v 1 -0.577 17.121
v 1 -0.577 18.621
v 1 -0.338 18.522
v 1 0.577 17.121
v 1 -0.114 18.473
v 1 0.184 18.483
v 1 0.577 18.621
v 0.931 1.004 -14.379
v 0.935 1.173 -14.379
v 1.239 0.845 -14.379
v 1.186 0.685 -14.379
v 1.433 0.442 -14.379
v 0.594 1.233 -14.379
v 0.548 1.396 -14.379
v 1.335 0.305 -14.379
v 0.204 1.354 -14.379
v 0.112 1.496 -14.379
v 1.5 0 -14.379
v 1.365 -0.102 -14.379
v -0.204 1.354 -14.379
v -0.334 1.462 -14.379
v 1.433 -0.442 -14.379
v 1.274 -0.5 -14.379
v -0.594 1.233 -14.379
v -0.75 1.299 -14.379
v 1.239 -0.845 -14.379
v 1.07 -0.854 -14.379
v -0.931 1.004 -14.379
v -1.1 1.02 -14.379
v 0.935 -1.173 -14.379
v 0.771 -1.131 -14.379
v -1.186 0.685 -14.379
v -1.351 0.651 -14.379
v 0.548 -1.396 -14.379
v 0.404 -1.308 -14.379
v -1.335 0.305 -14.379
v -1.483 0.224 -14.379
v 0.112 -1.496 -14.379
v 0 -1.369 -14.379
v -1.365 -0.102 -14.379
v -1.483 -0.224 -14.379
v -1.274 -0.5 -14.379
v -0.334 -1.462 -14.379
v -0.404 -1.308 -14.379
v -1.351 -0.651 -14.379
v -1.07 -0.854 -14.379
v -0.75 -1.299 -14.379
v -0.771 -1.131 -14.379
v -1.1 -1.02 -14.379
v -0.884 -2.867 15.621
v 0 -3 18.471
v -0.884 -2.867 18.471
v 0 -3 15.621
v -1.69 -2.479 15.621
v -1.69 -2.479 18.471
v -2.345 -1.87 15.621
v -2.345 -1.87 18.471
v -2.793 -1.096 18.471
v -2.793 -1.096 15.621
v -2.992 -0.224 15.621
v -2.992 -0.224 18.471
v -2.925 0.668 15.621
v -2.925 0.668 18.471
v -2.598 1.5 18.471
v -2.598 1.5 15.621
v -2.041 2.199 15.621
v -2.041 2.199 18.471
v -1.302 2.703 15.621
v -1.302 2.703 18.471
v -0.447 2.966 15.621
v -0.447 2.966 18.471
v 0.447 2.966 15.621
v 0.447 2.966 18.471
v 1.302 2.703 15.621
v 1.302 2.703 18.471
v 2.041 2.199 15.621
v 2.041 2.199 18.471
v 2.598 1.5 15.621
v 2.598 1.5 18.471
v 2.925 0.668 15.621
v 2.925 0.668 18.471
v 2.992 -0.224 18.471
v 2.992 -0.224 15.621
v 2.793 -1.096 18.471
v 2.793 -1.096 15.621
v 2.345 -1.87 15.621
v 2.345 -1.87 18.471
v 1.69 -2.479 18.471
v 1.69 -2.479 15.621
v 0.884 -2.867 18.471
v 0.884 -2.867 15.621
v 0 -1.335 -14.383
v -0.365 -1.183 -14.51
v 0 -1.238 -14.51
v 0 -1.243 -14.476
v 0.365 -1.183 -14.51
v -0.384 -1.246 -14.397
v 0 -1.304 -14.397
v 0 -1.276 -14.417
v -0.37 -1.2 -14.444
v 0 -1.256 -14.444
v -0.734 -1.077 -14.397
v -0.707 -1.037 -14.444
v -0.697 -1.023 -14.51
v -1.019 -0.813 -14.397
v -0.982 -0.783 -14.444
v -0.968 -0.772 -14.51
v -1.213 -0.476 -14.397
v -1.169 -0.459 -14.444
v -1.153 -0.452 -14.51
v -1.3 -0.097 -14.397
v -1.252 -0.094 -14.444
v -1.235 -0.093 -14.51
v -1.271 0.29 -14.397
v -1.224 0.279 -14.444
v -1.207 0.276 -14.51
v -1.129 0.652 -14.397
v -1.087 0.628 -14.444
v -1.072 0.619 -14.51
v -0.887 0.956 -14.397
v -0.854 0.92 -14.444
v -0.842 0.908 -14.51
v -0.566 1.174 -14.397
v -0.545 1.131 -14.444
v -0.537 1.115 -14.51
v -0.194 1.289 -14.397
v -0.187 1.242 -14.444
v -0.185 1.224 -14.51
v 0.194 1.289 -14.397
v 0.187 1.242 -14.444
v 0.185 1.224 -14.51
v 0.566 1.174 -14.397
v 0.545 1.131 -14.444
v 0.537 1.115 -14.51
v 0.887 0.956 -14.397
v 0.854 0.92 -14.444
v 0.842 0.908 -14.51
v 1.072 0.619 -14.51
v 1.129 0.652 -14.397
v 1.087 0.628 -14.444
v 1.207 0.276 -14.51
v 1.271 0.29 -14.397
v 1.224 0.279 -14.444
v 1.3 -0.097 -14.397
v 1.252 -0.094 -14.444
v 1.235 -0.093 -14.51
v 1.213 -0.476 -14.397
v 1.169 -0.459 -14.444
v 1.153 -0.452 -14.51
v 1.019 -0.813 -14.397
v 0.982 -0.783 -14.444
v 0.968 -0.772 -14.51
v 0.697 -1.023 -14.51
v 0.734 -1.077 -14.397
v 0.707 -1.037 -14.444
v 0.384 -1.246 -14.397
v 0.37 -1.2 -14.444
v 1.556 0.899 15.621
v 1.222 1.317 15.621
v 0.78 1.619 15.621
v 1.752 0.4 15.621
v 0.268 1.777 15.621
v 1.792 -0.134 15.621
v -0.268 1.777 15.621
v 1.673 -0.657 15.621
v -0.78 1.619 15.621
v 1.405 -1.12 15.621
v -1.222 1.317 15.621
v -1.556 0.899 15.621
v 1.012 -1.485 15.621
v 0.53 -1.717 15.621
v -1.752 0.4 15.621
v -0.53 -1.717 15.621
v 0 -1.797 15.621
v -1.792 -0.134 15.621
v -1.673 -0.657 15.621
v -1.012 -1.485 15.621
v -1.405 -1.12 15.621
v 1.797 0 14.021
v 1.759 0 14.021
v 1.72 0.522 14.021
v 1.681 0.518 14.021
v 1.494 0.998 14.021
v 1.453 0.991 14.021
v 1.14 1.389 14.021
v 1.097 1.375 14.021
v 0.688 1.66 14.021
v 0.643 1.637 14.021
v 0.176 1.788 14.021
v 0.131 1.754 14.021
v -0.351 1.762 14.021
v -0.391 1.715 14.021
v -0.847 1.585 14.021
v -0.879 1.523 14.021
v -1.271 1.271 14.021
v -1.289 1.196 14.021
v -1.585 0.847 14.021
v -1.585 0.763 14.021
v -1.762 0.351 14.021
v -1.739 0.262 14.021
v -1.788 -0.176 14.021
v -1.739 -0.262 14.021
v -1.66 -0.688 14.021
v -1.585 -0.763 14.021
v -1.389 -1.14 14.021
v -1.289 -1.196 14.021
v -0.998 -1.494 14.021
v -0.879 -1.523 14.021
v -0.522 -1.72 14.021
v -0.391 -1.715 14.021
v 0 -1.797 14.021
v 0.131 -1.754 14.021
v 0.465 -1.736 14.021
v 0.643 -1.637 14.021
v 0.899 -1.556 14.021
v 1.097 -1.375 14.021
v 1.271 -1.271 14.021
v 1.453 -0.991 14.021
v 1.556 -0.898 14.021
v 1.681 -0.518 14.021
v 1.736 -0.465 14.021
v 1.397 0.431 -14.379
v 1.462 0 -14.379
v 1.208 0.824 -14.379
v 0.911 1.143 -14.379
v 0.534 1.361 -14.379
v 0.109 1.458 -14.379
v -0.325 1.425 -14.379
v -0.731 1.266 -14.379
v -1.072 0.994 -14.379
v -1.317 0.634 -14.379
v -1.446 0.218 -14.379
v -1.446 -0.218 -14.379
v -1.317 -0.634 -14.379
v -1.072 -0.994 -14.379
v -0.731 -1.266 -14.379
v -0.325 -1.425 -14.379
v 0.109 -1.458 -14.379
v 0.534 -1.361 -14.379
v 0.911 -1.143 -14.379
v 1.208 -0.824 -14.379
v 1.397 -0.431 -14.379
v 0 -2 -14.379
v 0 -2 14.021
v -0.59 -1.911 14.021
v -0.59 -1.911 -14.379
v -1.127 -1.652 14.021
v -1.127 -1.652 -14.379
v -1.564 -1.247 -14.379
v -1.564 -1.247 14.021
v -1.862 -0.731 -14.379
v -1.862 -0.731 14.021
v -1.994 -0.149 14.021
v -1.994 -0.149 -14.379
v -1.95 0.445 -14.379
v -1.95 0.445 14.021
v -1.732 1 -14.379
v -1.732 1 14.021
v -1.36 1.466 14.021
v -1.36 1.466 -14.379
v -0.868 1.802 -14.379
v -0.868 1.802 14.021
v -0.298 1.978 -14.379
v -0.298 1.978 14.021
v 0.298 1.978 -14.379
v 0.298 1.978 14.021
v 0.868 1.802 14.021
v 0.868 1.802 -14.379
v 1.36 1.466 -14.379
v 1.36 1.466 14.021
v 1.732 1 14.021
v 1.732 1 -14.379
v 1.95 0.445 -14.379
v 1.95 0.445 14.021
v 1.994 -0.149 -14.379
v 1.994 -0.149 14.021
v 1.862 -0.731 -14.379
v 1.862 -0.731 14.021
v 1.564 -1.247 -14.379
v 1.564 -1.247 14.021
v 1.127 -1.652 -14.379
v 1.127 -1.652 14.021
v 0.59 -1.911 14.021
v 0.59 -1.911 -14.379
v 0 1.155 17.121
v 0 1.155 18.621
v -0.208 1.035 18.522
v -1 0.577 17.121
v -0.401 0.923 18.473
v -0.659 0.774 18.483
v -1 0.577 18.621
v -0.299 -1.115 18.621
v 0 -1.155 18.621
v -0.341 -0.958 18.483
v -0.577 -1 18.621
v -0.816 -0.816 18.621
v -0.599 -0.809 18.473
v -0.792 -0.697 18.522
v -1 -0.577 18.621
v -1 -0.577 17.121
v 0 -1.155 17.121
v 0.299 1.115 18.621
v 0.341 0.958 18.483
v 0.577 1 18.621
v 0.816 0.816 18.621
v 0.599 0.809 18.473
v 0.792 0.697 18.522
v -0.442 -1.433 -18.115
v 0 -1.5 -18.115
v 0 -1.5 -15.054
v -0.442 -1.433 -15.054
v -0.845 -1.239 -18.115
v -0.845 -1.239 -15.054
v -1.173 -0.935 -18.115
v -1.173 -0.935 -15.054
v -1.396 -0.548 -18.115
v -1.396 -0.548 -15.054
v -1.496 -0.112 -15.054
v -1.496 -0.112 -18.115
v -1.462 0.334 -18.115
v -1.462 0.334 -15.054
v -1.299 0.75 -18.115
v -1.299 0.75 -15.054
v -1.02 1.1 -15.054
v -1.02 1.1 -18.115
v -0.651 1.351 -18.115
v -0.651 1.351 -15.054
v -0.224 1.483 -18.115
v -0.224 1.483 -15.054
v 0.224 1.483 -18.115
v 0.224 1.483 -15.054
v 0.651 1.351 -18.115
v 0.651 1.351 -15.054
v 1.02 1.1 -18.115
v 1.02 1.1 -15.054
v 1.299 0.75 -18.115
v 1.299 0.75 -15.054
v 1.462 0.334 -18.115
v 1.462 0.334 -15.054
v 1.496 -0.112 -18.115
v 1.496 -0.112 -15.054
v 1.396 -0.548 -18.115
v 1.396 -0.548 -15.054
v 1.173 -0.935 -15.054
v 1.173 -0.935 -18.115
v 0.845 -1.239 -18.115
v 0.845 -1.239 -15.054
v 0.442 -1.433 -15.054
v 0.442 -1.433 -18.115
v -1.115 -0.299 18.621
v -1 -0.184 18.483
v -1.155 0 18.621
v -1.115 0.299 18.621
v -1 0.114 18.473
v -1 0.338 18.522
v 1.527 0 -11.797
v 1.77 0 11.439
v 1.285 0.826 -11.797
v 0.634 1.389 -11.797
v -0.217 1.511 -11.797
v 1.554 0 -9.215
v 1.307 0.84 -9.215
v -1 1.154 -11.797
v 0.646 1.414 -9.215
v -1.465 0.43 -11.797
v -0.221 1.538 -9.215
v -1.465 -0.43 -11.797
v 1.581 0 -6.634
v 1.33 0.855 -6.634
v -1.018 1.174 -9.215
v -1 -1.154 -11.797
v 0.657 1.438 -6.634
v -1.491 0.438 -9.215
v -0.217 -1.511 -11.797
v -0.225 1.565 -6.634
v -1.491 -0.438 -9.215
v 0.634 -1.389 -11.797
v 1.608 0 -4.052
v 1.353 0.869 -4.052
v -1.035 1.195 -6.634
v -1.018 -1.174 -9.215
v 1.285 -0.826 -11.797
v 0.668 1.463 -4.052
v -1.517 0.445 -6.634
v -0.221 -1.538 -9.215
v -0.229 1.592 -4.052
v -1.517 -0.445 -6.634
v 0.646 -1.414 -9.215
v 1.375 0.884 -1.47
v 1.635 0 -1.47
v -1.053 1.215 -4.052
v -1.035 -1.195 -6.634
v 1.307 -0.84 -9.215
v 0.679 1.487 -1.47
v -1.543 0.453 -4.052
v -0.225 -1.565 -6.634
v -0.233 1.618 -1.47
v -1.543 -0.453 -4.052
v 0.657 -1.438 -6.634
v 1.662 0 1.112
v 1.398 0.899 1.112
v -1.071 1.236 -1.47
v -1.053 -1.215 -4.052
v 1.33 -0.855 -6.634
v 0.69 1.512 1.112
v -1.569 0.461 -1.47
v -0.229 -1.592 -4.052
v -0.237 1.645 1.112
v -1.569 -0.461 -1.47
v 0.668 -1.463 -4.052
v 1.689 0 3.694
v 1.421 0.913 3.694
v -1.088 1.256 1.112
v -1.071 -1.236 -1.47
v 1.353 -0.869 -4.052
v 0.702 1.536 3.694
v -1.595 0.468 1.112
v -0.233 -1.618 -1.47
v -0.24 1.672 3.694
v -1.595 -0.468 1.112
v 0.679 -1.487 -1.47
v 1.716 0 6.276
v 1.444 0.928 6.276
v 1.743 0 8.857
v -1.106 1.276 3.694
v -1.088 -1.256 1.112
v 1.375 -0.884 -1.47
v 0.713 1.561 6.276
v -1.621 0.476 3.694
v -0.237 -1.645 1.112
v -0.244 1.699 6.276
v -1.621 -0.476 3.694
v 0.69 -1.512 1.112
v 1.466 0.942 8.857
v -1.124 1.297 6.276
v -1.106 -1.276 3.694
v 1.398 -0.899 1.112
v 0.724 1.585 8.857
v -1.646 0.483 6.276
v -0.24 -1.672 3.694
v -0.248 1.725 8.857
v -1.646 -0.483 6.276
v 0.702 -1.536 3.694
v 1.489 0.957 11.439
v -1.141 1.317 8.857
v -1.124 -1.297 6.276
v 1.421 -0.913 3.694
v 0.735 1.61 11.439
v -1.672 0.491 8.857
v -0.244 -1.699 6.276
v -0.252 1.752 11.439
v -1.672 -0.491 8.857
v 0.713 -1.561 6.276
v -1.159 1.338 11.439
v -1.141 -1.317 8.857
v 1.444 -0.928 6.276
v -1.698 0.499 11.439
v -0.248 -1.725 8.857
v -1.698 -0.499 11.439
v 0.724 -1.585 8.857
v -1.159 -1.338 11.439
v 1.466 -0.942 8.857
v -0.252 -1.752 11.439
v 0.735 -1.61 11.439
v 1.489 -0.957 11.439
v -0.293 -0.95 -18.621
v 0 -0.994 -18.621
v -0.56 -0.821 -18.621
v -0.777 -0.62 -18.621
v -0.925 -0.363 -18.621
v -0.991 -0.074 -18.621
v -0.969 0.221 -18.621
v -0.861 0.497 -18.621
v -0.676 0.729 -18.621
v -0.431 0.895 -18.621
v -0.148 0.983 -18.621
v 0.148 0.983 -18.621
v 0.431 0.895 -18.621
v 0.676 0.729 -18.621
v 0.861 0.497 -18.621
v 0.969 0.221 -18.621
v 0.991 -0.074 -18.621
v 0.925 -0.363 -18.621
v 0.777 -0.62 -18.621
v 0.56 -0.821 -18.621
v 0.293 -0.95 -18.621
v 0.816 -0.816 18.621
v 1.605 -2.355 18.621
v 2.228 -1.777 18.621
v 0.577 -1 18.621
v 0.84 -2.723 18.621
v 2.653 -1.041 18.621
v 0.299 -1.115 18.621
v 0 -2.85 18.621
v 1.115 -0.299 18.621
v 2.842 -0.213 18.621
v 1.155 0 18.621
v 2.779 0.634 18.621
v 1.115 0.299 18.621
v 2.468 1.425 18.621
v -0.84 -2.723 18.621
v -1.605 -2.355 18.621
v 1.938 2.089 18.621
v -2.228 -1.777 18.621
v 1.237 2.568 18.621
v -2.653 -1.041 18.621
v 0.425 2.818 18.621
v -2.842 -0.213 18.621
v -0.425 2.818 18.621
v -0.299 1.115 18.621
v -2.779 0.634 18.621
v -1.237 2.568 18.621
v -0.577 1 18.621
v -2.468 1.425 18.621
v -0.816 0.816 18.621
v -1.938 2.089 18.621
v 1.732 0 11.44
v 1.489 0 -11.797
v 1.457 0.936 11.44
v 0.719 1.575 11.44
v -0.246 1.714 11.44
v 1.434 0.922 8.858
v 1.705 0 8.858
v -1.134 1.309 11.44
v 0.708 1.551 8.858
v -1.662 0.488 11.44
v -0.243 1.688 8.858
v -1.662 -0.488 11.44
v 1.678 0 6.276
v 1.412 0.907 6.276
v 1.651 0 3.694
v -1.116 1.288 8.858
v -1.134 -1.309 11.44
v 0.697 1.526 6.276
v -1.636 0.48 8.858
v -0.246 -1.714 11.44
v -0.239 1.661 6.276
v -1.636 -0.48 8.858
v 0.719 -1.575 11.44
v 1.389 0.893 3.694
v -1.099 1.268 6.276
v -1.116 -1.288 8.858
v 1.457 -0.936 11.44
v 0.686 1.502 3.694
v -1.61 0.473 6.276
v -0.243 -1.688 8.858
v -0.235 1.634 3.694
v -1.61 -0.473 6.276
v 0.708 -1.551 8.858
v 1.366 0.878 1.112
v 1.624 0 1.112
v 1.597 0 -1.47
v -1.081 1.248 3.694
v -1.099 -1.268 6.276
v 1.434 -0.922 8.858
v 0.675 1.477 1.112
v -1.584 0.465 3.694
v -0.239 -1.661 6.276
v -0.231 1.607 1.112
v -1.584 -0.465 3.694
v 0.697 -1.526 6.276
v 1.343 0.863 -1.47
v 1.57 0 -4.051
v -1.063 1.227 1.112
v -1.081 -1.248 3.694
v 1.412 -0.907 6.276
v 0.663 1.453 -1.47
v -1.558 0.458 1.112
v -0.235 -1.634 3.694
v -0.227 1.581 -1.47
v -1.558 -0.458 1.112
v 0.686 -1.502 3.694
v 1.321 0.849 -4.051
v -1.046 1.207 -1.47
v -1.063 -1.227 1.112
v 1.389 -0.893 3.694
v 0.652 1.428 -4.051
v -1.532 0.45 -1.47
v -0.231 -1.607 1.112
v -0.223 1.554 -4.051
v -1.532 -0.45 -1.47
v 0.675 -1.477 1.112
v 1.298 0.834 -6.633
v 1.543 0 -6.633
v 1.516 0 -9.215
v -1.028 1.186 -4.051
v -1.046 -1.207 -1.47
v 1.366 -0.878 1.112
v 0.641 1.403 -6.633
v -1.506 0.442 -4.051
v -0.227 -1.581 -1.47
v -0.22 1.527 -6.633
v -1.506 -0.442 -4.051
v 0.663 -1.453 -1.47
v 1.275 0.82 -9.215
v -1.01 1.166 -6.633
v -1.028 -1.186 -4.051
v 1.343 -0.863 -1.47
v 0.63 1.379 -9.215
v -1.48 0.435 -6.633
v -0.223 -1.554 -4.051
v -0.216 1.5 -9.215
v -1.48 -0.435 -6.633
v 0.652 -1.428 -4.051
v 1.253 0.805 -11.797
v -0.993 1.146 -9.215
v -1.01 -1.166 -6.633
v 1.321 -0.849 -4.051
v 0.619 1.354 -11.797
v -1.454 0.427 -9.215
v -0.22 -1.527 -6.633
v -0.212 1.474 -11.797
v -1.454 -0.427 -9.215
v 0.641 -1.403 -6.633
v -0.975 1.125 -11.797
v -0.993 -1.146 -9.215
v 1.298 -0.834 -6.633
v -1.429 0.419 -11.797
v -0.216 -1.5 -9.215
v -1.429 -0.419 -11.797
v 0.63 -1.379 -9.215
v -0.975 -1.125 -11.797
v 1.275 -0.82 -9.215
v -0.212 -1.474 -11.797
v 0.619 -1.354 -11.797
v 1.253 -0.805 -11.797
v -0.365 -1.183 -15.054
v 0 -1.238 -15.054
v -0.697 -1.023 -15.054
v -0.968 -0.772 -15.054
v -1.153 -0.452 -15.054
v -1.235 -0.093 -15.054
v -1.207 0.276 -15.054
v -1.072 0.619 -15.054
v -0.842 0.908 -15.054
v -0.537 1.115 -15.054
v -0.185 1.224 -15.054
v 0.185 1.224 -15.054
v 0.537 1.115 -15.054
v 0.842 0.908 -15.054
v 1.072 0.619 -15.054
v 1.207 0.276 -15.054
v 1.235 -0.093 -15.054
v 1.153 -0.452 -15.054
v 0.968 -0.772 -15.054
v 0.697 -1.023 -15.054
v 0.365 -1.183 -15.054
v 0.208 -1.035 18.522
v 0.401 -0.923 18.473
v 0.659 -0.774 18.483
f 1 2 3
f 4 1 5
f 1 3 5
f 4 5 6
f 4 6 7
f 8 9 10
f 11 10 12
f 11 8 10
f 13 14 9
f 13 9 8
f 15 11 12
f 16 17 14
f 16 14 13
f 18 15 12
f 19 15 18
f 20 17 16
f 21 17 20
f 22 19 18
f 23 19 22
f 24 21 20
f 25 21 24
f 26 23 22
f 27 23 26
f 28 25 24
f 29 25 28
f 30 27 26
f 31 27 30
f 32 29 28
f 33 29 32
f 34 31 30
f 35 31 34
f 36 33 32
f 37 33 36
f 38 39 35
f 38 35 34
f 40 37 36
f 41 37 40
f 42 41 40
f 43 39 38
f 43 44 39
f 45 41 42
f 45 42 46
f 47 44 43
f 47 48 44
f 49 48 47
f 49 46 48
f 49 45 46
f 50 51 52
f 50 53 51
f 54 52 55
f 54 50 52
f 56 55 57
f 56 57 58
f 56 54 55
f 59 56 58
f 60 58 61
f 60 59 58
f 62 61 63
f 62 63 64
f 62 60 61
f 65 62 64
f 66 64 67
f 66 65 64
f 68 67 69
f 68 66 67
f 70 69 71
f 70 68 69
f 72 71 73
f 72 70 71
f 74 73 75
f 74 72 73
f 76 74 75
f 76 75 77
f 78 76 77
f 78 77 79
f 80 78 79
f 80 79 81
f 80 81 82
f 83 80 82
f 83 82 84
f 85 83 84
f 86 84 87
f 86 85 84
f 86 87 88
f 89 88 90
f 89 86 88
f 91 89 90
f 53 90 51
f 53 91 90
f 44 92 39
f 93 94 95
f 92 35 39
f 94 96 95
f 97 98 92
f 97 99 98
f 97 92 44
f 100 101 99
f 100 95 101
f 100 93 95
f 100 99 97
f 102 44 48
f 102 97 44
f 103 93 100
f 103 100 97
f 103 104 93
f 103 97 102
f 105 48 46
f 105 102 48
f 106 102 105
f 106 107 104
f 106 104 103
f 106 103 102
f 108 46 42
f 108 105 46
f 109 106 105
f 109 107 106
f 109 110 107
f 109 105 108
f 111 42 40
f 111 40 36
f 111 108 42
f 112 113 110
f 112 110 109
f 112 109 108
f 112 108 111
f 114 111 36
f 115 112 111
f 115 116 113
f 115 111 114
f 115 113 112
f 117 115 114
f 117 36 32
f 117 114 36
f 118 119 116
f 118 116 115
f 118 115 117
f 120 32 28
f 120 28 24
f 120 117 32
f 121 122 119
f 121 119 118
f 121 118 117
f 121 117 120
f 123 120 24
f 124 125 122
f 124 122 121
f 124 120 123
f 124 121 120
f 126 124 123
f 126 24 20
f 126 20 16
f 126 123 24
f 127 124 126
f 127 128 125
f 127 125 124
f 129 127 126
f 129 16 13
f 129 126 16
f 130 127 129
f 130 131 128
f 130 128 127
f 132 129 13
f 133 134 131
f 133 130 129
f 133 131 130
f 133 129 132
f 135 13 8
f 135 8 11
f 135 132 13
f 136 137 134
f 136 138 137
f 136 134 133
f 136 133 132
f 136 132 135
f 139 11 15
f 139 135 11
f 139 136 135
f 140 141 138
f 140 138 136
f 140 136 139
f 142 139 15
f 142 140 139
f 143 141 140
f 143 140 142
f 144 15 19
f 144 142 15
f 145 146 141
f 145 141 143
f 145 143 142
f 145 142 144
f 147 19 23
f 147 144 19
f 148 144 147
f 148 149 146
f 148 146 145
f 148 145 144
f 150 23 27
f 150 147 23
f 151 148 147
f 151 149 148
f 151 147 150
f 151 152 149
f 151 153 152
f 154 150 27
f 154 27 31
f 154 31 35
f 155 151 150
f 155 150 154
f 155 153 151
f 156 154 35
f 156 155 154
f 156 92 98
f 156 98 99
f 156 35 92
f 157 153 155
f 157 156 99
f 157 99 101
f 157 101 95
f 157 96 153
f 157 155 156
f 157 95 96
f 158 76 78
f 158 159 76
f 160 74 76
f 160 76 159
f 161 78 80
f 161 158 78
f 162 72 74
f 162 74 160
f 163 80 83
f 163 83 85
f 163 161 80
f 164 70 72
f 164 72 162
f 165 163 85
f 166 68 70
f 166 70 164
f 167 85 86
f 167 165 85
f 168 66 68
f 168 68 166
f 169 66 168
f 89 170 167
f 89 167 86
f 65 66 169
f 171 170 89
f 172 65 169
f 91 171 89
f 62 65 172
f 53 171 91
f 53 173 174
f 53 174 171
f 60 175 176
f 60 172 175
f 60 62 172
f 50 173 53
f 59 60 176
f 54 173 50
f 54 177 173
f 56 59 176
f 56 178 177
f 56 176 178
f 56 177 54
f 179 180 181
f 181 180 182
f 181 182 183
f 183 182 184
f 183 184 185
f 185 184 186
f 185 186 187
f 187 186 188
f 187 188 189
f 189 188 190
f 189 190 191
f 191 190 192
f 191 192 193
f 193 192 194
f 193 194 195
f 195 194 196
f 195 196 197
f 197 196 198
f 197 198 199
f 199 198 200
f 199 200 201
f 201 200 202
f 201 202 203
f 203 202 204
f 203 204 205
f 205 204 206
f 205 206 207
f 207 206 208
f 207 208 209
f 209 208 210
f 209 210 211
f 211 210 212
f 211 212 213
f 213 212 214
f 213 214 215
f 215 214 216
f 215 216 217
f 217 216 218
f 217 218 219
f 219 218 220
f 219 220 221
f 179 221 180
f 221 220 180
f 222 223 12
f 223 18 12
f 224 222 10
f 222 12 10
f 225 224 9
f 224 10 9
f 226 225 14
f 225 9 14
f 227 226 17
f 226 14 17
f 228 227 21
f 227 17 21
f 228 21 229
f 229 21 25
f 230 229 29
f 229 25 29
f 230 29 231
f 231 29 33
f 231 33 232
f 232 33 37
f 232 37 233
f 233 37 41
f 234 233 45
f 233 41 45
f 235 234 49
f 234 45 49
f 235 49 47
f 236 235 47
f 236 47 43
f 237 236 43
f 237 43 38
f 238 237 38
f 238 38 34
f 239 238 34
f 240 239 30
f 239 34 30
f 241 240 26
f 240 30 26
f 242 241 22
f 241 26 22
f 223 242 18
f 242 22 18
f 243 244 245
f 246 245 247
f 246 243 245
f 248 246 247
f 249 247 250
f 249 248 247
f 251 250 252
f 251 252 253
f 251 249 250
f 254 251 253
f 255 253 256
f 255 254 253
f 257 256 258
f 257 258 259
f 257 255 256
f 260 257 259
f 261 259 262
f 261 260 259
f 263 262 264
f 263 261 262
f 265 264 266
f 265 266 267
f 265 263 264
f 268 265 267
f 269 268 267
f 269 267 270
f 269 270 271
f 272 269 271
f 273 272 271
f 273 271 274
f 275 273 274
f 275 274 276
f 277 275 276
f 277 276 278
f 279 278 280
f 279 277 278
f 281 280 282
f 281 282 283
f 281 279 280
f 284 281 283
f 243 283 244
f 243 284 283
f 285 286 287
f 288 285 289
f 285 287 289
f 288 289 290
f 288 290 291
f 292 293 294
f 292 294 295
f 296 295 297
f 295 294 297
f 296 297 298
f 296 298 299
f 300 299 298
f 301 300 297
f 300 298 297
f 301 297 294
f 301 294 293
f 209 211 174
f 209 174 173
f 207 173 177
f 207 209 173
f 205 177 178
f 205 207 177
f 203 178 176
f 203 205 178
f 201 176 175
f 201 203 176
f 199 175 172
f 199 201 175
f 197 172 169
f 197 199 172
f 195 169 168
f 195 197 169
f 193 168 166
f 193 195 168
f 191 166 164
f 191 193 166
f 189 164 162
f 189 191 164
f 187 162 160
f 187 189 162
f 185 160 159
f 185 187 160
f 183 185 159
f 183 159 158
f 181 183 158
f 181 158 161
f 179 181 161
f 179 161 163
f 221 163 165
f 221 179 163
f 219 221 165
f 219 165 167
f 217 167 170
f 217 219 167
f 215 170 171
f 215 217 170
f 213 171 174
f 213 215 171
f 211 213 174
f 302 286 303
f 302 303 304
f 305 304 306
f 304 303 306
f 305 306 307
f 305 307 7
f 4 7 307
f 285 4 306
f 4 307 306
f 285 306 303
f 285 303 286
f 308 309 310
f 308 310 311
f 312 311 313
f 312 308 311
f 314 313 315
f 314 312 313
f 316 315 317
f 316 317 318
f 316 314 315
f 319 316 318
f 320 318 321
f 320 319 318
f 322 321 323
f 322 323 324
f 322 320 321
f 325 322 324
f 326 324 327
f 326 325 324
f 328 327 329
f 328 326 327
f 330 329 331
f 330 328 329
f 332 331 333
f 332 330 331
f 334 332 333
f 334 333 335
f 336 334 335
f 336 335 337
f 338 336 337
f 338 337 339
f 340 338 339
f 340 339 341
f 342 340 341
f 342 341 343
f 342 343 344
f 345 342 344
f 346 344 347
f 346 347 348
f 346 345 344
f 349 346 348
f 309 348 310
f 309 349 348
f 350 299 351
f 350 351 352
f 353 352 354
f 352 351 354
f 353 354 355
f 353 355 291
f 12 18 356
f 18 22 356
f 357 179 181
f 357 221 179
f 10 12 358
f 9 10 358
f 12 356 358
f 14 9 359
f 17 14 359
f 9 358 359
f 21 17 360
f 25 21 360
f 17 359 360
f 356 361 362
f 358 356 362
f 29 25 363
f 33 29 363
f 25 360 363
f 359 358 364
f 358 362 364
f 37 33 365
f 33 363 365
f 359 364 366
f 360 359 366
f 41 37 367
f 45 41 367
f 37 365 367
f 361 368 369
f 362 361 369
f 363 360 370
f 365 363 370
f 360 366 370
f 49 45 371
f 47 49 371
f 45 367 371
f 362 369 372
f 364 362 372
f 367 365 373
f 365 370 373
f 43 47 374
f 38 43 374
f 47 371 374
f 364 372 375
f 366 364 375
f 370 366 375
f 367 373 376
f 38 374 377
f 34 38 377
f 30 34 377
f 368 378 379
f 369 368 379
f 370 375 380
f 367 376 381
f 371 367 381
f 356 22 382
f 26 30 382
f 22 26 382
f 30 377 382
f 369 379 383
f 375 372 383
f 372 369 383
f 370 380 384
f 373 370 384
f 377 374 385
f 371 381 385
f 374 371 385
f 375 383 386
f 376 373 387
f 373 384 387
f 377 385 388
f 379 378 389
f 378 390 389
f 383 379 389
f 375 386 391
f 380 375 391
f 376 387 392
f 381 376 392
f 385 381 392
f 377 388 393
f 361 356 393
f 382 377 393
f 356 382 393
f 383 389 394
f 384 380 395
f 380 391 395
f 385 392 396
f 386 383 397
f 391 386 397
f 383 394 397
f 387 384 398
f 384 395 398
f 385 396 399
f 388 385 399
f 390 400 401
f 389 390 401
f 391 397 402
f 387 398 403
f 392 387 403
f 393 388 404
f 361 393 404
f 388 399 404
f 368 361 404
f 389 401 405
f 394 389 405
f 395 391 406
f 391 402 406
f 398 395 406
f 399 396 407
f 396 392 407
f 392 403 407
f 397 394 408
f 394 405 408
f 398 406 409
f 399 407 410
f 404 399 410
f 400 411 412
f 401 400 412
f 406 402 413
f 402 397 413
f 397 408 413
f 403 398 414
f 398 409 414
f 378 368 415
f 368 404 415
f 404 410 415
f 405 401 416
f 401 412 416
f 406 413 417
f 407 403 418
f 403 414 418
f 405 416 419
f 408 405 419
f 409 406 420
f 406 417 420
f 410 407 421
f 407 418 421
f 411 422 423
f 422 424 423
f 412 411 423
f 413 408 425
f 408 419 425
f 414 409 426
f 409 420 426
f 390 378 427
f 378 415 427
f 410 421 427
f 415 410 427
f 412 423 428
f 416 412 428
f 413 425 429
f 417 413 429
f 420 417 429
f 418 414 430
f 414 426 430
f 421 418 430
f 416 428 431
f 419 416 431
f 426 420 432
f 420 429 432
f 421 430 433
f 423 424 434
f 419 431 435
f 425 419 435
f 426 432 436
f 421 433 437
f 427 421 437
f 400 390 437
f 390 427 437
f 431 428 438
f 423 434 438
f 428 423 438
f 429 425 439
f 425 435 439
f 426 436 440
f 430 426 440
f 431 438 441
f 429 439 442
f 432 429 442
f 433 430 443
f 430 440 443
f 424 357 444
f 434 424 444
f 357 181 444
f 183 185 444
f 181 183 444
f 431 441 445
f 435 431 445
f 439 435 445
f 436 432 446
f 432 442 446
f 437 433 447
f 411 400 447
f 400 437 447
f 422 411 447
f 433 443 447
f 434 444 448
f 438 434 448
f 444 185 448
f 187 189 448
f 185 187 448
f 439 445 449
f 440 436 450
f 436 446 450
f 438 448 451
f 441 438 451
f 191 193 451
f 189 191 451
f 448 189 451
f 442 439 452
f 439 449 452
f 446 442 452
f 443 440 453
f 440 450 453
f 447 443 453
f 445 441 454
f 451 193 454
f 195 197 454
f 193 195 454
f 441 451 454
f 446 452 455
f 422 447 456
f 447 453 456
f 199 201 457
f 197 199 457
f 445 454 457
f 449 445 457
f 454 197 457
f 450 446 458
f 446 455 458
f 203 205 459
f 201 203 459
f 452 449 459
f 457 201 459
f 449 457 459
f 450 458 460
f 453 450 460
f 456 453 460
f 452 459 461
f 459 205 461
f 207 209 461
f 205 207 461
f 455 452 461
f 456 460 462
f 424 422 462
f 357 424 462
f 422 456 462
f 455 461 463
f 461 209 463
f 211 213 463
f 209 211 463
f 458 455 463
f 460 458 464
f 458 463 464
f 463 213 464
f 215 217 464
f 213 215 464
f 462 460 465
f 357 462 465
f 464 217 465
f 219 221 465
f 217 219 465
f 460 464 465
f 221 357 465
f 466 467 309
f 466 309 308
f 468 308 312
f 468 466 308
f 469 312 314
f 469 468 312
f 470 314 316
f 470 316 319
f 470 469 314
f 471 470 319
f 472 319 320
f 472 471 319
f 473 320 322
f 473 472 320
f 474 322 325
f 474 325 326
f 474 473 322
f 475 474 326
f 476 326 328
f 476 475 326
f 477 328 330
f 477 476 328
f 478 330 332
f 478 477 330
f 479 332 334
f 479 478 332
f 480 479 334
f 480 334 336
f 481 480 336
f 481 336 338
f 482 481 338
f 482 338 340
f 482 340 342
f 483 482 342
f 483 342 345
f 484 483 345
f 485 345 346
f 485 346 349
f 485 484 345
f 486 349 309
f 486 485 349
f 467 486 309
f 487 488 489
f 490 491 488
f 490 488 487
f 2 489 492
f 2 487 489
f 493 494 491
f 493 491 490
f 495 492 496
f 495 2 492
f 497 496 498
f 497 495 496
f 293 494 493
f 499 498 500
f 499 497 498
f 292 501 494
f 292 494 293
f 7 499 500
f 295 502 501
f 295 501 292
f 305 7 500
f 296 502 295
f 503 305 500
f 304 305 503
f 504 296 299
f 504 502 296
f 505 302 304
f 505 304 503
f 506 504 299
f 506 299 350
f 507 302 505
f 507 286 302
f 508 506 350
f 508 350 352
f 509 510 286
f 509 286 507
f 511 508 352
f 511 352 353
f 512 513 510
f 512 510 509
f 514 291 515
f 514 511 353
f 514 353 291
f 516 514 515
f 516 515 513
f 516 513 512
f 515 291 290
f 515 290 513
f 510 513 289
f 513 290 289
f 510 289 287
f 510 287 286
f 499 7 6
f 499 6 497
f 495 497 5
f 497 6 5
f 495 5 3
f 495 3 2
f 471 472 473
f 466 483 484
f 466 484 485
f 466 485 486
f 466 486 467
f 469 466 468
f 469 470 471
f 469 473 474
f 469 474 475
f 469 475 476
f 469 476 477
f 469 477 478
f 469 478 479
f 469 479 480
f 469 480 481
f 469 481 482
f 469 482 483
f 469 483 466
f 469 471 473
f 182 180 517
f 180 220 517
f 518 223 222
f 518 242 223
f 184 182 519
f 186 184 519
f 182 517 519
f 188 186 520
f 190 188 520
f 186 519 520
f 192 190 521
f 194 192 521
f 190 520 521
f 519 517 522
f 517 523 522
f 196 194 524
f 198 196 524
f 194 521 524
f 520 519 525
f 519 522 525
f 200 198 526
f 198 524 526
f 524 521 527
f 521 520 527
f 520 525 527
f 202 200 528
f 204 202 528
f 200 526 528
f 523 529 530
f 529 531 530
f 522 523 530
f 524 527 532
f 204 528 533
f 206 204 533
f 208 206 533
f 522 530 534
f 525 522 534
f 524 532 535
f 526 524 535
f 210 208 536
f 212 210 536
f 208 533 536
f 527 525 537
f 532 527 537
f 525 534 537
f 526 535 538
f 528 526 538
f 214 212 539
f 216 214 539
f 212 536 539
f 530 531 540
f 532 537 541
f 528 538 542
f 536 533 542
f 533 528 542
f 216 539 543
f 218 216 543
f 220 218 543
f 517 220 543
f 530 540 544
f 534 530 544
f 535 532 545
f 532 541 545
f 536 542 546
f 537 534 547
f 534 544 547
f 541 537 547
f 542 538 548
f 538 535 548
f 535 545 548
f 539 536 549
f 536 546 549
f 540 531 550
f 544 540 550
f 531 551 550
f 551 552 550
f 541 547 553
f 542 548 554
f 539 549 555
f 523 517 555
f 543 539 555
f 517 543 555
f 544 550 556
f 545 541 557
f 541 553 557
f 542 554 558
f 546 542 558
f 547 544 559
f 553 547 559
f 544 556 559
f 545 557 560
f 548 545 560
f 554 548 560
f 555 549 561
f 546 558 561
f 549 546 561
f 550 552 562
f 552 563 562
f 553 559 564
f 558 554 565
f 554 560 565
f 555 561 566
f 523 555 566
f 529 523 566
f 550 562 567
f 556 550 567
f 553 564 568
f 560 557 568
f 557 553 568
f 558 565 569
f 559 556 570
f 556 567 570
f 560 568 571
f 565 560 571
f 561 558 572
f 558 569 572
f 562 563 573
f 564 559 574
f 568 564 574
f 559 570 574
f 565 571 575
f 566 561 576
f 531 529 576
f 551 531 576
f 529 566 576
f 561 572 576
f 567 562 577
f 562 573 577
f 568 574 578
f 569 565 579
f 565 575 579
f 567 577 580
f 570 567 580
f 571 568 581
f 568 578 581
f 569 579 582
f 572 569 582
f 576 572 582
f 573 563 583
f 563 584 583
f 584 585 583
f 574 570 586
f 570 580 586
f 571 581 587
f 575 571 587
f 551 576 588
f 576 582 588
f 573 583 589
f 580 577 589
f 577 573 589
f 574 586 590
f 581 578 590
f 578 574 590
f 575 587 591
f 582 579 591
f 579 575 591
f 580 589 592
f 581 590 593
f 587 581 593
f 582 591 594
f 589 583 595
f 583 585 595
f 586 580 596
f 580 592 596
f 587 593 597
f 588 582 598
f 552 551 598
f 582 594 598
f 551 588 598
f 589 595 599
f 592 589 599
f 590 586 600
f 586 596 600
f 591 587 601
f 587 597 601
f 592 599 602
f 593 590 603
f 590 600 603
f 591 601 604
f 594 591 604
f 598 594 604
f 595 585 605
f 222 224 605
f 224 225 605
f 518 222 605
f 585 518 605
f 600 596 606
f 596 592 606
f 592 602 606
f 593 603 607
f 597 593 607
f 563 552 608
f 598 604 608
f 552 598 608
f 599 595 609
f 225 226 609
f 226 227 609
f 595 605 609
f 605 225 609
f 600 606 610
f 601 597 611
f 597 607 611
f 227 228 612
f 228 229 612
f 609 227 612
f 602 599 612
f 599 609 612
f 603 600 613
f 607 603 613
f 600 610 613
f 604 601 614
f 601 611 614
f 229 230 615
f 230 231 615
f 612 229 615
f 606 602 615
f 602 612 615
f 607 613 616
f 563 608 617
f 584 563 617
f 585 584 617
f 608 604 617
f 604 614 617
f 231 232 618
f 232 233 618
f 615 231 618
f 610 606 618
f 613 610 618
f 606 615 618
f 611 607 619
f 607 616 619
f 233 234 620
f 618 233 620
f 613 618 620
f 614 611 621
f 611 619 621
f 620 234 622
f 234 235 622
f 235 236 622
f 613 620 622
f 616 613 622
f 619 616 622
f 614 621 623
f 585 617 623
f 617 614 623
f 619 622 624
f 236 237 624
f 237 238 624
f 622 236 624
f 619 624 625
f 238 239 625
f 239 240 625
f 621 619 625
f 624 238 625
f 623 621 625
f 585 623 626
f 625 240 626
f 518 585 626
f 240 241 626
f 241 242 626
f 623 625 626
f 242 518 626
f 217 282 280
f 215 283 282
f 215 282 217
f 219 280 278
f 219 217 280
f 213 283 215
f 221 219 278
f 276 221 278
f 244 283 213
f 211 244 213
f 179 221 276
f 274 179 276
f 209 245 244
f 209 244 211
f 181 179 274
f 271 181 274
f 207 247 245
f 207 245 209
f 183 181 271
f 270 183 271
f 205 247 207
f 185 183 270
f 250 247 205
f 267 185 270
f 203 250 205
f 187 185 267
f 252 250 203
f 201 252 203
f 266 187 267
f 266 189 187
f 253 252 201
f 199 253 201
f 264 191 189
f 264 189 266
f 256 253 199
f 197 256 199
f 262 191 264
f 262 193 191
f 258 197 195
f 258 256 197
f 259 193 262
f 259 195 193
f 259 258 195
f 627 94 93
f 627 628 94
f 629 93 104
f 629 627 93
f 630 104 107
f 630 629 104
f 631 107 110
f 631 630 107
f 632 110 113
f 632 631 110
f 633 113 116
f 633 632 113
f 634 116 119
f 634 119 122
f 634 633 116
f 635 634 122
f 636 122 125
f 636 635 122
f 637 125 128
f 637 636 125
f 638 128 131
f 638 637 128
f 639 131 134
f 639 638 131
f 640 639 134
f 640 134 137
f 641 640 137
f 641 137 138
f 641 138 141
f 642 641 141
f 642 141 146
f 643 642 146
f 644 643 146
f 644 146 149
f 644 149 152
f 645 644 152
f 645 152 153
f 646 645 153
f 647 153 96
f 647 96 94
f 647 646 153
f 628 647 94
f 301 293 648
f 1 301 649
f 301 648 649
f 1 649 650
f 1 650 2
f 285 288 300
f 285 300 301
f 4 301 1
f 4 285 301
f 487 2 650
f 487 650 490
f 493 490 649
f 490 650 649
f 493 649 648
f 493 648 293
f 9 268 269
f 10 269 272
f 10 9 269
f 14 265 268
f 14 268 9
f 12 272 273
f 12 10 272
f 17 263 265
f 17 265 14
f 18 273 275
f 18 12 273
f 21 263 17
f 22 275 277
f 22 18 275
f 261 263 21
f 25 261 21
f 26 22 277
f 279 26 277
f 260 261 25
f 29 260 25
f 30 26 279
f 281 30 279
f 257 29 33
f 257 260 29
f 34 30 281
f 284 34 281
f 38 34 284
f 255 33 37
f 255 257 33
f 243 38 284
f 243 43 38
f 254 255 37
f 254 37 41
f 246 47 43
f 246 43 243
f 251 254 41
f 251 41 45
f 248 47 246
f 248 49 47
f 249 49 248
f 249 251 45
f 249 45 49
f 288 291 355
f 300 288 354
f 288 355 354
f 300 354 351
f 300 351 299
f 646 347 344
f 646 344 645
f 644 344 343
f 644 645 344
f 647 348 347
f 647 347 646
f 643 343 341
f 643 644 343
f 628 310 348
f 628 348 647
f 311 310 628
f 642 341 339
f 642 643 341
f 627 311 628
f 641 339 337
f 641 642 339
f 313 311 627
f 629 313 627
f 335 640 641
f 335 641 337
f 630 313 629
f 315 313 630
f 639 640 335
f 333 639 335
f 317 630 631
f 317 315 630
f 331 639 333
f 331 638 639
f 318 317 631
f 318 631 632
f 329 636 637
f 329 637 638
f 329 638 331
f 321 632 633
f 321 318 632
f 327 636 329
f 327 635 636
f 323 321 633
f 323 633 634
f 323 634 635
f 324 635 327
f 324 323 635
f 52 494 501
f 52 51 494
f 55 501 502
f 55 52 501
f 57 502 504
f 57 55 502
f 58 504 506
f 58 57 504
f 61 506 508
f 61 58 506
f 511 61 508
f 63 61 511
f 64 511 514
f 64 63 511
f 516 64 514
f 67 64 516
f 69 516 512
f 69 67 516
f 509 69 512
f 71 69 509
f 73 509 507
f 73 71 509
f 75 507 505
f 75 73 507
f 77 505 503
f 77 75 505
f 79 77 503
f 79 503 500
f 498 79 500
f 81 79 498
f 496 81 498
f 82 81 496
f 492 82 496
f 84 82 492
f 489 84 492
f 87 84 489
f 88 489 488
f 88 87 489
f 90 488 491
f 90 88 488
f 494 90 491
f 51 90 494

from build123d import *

# Parameters (mm, degrees)
CUT_EXTRUDE1_START = 18.621
CUT_EXTRUDE1_DEPTH = 1.5
CHAMFER2_SIZE      = 0.506148016


# Read off the part's stored shape, not the designer's step: Cut-Revolve-Thin1
with BuildPart() as part:
    # Sketch3 → Revolve1 (revolve)
    with BuildSketch(Plane(origin=(0, 0, 0), x_dir=(0, 0, -1), z_dir=(1, 0, 0)), mode=Mode.PRIVATE) as revolve1_sk:
        with BuildLine():
            Line((-18.621, 0), (-18.621, 2.805))
            Line((-18.621, 2.805), (-18.621, 3))
            Line((-18.621, 3), (-15.816, 3))
            Line((-15.816, 3), (-15.621, 3))
            Line((-15.621, 3), (-15.621, 1.797))
            Line((-15.621, 1.797), (-14.021, 1.797))
            Line((-14.021, 1.797), (-14.021, 2))
            Line((-14.021, 2), (14.379, 2))
            Line((14.379, 2), (14.379, 1.36904775))
            ThreePointArc((14.379, 1.36904775), (14.417355026, 1.276450526), (14.50995225, 1.2380955))
            Line((14.50995225, 1.2380955), (15.053864022, 1.2380955))
            Line((15.053864022, 1.2380955), (15.053864022, 1.5))
            Line((15.053864022, 1.5), (18.246, 1.5))
            Line((18.246, 1.5), (18.621, 1.5))
            Line((18.621, 1.5), (18.621, 0))
            Line((18.621, 0), (-18.621, 0))
        make_face()
    revolve(revolve1_sk.sketch.rotate(Axis((0, 0, 18.621), (0, 0, -1)), 180), axis=Axis((0, 0, 18.621), (0, 0, -1)))

    # Cut-Revolve-Thin1 outline → Cut-Revolve-Thin1 (revolve, cut)
    with BuildSketch(Plane.XZ):
        Polygon((1.758902083, 14.021398418), (1.461902083, -14.378601582), (1.5, -14.379), (1.797, 14.021), align=None)
    revolve(axis=Axis((0, 0, 0), (0, 0, 1)), mode=Mode.SUBTRACT)

    # Sketch4 → Cut-Extrude1 (cut)
    with BuildSketch(Plane.XY.offset(CUT_EXTRUDE1_START)):
        Polygon((0, 1.154700538), (-1, 0.577350269), (-1, -0.577350269), (0, -1.154700538), (1, -0.577350269), (1, 0.577350269), align=None)
    extrude(amount=-CUT_EXTRUDE1_DEPTH, mode=Mode.SUBTRACT)

    # Cut-Extrude2 cone 1 section (through the dimple's axis) → Cut-Extrude2 (revolve, cut)
    with BuildSketch(Plane(origin=(0, 0, 18.621), x_dir=(0, -1, 0), z_dir=(1, 0, 0))):
        Polygon((0, 0), (1.154700538, 0), (0, 1.154700538), align=None)
    revolve(axis=Axis((0, 0, 18.621), (0, 0, -1)), mode=Mode.SUBTRACT)

    # Chamfer2
    chamfer2_edges = [part.edges().sort_by_distance(p)[0] for p in [
        (0, 1.5, -18.621),
    ]]
    chamfer(chamfer2_edges, length=CHAMFER2_SIZE)

    # Sketch10 → Cut-Revolve2 (revolve, cut)
    with BuildSketch(Plane(origin=(0, 0, 0), x_dir=(0, 0, -1), z_dir=(1, 0, 0)), mode=Mode.PRIVATE) as cut_revolve2_sk:
        Polygon((-18.621, 2.85), (-18.471, 3), (-18.621, 3), align=None)
    revolve(cut_revolve2_sk.sketch.rotate(Axis((0, 0, 18.621), (0, 0, -1)), 180), axis=Axis((0, 0, 18.621), (0, 0, -1)), mode=Mode.SUBTRACT)


solid = part.part
